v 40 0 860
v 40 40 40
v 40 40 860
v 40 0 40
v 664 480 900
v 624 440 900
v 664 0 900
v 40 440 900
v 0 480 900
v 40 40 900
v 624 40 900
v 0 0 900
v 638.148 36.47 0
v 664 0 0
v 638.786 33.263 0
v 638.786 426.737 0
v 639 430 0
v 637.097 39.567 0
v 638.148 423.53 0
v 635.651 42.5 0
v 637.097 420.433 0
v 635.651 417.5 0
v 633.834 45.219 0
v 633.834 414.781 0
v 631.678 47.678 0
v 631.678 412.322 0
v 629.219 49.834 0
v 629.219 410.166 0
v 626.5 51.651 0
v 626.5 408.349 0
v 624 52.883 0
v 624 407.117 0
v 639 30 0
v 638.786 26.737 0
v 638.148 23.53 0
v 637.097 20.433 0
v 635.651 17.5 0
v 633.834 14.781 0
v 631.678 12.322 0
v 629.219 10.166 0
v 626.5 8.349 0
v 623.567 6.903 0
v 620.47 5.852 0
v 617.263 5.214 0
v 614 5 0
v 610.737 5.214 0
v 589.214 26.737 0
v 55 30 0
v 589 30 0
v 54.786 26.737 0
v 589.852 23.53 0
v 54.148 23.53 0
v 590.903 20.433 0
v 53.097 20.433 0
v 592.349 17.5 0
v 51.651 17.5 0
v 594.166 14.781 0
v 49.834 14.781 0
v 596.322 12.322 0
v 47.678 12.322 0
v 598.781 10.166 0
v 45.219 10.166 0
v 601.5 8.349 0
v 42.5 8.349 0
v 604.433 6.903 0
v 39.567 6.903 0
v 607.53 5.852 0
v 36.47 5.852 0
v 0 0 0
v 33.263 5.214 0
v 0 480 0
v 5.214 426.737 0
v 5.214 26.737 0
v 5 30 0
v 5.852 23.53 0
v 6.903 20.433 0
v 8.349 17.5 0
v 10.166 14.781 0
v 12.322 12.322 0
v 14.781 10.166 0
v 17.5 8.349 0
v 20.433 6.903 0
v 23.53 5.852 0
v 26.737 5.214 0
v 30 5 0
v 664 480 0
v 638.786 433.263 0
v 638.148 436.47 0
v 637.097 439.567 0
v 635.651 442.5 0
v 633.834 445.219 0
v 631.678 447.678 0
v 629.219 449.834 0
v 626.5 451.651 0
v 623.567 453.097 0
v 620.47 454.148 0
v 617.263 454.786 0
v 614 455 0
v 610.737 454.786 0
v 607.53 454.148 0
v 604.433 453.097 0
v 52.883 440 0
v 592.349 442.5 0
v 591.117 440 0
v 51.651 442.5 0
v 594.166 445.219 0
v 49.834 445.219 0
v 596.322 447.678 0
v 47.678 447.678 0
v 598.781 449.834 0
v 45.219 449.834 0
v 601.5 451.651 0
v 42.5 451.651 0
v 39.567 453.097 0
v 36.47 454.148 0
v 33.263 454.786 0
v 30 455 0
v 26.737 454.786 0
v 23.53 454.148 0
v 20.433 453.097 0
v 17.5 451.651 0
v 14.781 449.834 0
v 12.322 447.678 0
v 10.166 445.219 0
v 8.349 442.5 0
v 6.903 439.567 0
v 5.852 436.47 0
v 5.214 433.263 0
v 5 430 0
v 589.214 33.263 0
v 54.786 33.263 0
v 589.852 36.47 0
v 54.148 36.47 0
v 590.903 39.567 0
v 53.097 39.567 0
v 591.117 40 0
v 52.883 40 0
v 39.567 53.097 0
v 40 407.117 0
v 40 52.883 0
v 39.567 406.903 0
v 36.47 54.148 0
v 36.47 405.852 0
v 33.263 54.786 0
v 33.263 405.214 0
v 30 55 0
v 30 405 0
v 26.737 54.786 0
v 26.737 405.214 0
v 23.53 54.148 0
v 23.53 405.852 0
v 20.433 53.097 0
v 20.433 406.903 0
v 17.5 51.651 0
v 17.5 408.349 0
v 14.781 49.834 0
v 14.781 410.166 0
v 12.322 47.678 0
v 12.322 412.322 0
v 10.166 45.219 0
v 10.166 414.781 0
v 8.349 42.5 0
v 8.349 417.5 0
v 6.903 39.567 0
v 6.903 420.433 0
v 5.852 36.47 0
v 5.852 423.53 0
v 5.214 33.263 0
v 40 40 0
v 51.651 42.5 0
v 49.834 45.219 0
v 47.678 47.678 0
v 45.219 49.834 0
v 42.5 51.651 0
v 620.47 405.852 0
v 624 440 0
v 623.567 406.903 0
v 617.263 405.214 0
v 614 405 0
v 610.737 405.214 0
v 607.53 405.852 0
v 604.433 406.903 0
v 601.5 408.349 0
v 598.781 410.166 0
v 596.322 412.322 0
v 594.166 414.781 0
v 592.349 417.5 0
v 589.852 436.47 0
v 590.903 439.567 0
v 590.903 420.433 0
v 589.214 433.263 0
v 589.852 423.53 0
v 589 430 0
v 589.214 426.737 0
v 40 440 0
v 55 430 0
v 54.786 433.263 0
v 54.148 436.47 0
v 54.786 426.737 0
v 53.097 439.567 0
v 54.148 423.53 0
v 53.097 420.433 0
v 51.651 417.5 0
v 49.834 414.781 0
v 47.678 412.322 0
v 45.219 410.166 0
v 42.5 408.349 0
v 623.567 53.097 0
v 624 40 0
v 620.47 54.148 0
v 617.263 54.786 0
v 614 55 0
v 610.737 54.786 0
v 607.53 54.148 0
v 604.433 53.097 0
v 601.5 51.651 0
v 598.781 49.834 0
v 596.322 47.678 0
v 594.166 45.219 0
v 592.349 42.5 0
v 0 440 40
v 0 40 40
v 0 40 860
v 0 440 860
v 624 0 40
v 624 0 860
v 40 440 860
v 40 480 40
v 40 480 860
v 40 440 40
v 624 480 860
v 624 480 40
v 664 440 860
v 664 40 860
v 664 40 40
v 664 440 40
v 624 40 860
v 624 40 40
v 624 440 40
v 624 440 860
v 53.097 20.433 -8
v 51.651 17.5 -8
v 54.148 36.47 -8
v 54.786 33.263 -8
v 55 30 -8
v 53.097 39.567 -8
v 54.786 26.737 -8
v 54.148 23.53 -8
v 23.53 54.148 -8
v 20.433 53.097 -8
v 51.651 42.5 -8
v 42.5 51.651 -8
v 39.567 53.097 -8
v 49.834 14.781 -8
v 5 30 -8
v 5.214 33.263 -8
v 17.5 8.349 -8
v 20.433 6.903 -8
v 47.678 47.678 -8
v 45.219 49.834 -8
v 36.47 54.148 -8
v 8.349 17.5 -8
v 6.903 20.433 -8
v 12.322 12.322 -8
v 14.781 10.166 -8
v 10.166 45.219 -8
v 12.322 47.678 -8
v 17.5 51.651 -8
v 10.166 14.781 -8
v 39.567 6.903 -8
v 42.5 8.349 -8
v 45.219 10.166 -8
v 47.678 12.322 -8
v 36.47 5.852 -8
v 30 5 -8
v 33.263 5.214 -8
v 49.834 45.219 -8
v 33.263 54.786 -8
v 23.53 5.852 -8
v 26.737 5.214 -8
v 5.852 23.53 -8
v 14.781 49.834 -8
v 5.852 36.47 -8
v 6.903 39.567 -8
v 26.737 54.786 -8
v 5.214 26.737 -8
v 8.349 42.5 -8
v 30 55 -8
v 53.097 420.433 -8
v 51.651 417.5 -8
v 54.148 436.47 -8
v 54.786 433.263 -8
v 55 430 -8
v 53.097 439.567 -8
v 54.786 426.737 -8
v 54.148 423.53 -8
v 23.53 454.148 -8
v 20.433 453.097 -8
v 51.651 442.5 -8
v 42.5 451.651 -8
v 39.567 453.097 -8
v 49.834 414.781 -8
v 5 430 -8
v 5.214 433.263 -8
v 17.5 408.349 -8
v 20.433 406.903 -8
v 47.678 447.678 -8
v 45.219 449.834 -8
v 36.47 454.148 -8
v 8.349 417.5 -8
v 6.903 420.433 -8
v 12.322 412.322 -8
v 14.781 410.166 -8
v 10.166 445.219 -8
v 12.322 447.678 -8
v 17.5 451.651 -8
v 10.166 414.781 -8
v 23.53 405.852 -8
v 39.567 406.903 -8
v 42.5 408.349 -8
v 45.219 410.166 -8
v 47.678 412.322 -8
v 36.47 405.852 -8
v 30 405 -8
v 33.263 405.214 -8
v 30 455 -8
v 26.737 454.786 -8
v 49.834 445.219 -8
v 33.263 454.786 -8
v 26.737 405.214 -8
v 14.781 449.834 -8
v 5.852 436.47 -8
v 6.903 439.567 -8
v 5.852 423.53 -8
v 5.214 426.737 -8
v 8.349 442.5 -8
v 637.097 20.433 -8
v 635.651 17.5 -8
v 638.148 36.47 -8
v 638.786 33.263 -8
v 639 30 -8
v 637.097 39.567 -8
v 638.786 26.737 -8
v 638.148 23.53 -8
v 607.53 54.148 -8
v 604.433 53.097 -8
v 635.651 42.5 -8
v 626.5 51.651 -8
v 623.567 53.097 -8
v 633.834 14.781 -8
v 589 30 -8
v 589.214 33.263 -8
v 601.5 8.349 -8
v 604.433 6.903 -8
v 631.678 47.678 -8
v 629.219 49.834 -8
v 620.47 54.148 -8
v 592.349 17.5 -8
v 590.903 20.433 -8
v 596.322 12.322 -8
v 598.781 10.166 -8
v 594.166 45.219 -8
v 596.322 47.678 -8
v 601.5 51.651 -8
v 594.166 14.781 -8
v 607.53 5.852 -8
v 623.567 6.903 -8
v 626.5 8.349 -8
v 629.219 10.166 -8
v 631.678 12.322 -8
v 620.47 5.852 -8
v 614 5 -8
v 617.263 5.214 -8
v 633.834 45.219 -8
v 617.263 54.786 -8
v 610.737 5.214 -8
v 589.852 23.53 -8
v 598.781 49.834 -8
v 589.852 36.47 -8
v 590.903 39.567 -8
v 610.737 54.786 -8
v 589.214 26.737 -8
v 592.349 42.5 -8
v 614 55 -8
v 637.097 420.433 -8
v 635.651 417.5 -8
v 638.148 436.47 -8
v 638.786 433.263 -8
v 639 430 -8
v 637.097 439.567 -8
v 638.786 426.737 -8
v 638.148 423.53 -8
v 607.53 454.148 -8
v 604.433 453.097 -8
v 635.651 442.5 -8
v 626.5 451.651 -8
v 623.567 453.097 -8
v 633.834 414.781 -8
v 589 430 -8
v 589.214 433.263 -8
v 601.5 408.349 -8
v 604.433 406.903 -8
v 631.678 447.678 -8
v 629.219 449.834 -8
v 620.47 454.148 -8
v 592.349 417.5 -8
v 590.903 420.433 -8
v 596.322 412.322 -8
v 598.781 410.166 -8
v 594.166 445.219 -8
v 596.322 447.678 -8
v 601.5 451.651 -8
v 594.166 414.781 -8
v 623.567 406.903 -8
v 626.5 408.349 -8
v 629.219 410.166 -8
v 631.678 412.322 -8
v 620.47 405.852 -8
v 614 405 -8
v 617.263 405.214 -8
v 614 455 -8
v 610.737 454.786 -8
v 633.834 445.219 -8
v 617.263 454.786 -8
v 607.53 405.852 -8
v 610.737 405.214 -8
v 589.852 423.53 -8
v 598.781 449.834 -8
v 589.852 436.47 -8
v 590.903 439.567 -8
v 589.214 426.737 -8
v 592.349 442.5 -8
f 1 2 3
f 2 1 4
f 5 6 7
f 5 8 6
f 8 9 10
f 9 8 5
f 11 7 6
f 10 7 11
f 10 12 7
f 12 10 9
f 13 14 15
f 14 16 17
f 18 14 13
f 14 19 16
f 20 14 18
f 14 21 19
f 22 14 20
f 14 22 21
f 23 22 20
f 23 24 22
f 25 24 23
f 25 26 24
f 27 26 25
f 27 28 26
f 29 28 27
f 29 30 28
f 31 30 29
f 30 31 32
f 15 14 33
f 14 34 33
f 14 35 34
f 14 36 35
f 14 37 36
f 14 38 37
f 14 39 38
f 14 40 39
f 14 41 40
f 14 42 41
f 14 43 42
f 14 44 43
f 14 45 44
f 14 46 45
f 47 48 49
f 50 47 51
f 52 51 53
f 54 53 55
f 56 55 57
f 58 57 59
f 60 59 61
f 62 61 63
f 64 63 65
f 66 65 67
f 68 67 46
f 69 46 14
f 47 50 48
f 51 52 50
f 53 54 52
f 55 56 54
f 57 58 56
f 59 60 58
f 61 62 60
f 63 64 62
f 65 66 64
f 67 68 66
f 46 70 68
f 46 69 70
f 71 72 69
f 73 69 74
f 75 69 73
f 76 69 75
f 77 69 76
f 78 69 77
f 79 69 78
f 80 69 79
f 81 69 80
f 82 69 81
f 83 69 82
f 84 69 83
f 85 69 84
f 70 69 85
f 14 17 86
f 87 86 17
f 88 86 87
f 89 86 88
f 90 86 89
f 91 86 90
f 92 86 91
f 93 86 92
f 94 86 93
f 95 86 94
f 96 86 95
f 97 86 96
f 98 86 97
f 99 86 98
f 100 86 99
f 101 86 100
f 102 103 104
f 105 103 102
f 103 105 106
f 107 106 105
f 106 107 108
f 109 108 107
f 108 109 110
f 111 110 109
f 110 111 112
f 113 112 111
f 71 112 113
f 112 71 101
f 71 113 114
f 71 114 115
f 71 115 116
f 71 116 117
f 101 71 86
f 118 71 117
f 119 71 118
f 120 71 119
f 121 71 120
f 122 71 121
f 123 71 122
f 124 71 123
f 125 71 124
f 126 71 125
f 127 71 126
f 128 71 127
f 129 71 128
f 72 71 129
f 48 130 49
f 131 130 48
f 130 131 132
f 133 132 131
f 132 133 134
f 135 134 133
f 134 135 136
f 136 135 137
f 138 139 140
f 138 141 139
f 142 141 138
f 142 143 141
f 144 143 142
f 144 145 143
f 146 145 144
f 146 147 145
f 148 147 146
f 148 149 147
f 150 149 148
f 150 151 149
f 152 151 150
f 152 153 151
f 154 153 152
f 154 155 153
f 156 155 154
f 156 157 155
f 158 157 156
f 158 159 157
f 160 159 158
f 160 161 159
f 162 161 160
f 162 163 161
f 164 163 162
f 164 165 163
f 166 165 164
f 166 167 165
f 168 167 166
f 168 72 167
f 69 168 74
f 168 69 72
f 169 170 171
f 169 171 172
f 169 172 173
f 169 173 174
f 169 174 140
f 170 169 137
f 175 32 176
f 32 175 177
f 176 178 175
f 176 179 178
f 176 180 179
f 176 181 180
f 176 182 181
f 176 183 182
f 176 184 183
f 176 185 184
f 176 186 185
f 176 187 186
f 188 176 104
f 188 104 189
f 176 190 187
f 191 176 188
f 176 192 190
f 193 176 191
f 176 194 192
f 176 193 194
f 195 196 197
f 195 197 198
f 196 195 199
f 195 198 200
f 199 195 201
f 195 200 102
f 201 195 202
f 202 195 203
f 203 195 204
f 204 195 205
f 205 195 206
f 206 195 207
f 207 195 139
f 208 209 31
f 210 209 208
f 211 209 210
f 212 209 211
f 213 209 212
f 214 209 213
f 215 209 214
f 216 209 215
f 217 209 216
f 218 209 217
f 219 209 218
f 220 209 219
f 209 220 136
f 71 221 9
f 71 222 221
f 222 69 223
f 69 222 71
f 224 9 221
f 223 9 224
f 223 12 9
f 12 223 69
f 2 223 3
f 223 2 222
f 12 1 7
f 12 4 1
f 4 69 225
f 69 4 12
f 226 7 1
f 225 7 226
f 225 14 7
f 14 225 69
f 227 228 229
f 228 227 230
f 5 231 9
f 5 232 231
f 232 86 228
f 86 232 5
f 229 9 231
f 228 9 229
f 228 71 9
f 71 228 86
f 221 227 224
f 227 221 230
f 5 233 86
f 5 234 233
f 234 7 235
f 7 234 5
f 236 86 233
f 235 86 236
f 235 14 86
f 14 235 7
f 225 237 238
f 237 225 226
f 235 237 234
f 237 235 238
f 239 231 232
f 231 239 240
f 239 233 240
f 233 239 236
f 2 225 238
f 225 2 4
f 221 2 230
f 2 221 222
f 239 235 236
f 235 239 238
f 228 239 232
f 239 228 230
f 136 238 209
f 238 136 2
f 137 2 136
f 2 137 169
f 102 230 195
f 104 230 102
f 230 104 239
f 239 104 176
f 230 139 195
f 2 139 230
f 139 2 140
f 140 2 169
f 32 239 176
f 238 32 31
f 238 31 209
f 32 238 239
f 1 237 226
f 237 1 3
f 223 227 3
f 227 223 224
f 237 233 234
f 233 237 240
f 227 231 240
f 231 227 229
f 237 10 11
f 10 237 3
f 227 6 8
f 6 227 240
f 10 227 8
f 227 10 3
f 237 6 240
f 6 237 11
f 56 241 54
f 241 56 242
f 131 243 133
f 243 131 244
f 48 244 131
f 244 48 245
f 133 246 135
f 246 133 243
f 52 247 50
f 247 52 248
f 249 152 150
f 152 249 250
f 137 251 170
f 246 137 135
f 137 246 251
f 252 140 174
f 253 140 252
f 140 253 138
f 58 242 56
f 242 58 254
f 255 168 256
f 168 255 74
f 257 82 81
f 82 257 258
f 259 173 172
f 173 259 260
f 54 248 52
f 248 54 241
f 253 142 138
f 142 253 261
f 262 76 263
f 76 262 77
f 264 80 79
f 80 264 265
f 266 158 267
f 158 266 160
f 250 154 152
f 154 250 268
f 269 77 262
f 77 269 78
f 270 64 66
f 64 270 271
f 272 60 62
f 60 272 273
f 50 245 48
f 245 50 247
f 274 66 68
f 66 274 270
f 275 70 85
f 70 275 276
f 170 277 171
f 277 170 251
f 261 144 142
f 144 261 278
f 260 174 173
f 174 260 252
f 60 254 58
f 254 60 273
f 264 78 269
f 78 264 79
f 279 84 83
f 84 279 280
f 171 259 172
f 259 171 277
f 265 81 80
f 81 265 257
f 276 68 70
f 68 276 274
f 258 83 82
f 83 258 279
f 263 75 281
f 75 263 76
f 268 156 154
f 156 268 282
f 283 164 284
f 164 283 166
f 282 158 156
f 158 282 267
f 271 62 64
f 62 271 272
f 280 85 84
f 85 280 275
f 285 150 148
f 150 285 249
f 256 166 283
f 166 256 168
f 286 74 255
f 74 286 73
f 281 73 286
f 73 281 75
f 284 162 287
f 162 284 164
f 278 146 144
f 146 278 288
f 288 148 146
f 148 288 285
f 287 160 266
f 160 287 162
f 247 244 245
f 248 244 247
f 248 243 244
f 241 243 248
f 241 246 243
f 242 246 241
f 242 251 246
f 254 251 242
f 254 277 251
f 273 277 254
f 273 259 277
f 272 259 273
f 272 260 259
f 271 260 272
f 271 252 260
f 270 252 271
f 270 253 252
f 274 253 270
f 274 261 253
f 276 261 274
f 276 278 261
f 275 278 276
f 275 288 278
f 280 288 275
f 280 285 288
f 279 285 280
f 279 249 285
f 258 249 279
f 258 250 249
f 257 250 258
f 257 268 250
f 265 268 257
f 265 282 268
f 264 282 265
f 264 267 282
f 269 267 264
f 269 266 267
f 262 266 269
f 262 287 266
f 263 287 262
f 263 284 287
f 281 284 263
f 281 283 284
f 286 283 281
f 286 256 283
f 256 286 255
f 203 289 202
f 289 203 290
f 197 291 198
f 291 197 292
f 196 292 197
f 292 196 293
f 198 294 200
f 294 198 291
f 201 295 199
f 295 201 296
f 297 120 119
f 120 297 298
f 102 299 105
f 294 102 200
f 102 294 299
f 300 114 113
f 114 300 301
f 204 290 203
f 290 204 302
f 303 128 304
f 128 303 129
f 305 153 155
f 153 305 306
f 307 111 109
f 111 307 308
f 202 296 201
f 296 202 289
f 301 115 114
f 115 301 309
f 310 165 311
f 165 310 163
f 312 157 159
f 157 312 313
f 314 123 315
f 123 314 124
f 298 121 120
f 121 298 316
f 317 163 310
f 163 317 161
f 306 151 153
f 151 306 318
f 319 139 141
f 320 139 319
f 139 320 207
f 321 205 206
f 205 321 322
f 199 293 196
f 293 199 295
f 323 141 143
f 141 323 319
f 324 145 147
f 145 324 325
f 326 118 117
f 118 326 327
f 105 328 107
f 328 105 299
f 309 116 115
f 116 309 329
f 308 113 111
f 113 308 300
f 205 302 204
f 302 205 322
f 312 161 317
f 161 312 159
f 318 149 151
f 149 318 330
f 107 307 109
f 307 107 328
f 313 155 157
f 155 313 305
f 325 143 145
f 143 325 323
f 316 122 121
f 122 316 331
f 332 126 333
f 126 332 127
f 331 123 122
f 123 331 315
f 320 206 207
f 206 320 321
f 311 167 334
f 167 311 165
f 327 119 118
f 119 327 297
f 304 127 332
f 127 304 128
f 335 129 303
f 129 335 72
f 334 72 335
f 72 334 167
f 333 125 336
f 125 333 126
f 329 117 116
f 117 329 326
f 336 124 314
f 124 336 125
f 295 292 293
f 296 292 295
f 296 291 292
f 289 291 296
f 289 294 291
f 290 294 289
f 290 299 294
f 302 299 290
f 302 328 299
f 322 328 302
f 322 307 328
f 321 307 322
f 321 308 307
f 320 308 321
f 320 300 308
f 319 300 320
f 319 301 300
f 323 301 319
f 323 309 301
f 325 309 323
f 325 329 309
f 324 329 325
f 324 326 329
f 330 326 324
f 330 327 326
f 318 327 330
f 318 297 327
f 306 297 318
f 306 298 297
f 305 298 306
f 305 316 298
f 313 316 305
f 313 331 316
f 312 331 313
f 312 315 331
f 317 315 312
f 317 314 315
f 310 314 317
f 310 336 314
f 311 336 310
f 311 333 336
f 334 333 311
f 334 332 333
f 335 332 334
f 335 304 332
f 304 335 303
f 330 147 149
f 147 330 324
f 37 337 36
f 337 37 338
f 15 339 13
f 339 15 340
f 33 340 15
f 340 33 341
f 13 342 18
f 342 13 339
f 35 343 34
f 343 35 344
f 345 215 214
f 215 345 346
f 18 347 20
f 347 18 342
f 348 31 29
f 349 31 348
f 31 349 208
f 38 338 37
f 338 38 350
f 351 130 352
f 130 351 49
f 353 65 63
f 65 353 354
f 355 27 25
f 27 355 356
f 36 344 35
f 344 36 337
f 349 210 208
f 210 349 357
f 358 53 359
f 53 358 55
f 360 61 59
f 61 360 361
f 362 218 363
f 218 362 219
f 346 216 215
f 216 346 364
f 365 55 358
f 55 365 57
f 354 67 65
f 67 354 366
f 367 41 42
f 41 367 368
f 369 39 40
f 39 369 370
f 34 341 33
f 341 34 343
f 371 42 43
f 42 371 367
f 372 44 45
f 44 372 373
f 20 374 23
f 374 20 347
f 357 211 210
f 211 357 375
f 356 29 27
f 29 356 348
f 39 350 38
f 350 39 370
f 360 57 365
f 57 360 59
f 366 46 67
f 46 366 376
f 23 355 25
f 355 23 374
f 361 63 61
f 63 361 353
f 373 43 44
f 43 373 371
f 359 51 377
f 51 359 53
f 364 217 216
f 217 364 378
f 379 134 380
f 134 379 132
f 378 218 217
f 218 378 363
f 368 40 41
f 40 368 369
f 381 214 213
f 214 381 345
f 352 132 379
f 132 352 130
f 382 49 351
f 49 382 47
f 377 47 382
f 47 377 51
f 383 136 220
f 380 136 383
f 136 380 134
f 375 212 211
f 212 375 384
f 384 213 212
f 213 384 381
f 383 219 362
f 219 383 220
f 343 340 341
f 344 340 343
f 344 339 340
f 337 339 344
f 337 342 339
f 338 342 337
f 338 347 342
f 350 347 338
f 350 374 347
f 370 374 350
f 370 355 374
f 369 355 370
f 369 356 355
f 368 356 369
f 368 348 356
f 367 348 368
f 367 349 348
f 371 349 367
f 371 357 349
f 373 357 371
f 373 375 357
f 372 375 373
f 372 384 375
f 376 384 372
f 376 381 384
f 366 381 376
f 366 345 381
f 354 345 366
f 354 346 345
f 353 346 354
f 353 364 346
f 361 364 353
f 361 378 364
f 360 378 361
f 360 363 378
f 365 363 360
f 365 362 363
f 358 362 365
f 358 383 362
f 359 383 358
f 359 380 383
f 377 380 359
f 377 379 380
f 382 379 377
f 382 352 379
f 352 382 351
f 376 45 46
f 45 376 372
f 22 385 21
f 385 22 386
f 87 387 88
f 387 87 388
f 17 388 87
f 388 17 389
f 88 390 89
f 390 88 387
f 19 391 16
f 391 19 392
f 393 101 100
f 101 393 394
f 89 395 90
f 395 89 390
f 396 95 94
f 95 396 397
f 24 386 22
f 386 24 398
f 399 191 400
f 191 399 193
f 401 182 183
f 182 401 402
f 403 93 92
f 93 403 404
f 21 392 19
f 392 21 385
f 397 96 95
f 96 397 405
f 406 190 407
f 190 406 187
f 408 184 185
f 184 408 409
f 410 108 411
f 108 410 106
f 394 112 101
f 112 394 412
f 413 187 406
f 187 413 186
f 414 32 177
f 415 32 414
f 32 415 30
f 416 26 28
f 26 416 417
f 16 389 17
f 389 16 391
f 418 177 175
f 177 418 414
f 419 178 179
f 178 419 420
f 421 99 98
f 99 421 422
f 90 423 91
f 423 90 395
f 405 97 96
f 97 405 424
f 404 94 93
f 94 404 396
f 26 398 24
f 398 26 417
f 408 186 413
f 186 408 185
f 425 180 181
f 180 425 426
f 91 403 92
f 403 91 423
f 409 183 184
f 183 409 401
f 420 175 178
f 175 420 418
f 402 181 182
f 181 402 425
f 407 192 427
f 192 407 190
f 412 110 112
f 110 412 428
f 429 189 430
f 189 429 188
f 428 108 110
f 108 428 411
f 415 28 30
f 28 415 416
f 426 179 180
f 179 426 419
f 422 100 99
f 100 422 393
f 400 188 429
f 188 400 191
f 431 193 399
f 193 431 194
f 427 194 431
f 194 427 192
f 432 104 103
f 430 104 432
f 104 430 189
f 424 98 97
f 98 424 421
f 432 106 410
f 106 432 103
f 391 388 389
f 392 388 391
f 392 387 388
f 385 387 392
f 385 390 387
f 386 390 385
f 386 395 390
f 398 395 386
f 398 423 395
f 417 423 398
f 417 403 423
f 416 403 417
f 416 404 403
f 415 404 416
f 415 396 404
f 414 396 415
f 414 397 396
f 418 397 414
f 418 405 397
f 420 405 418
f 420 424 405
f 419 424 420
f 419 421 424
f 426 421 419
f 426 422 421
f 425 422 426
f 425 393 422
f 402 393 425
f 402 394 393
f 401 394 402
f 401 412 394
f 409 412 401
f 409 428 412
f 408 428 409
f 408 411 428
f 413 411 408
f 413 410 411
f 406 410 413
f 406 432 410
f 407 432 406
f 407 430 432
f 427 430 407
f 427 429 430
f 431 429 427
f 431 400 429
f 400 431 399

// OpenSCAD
// file: lib/generated_constants.scad
// AUTO-GENERATED from simulation/sizing.py — do not hand edit
P_target_W = 10.0;
A_mem_m2 = 0.72;
active_w = 200.0;
active_h = 300.0;
n_plates = 12;
housing_od = 280.0;
housing_len = 264;
bolt_circle = 240.0;
frame_L = 664;
frame_W = 480.0;
frame_H = 900;
delta_P_bar = 34.58;
plate_pitch = 12;
// main file
// CHORUS-SGH-1 — 8020-style skid frame (aluminum extrusion representation)
include <lib/generated_constants.scad>

profile = 40;
wall_t = 3;

module extrusion_bar(len, axis="x") {
    if (axis == "x")
        cube([len, profile, profile]);
    else if (axis == "y")
        cube([profile, len, profile]);
    else
        cube([profile, profile, len]);
}

module skid_frame() {
    L = frame_L;
    W = frame_W;
    H = frame_H;
    // corners vertical
    for (dx = [0, L-profile], dy = [0, W-profile]) {
        translate([dx, dy, 0])
            extrusion_bar(H, "z");
    }
    // lower horizontal
    for (z = [0, H-profile]) {
        translate([0, 0, z]) {
            extrusion_bar(L, "x");
            translate([0, W-profile, 0])
                extrusion_bar(L, "x");
            extrusion_bar(W, "y");
            translate([L-profile, 0, 0])
                extrusion_bar(W, "y");
        }
    }
    // drip tray lip
    translate([20, 20, 20])
        difference() {
            cube([L-40, W-40, 5]);
            translate([5, 5, -1])
                cube([L-50, W-50, 7]);
        }
    // mounting feet
    for (dx = [30, L-50], dy = [30, W-50]) {
        translate([dx, dy, -8])
            cylinder(h=8, d=50, $fn=48);
    }
}

module sgh1_skid_frame_part() { skid_frame(); }
sgh1_skid_frame_part();
